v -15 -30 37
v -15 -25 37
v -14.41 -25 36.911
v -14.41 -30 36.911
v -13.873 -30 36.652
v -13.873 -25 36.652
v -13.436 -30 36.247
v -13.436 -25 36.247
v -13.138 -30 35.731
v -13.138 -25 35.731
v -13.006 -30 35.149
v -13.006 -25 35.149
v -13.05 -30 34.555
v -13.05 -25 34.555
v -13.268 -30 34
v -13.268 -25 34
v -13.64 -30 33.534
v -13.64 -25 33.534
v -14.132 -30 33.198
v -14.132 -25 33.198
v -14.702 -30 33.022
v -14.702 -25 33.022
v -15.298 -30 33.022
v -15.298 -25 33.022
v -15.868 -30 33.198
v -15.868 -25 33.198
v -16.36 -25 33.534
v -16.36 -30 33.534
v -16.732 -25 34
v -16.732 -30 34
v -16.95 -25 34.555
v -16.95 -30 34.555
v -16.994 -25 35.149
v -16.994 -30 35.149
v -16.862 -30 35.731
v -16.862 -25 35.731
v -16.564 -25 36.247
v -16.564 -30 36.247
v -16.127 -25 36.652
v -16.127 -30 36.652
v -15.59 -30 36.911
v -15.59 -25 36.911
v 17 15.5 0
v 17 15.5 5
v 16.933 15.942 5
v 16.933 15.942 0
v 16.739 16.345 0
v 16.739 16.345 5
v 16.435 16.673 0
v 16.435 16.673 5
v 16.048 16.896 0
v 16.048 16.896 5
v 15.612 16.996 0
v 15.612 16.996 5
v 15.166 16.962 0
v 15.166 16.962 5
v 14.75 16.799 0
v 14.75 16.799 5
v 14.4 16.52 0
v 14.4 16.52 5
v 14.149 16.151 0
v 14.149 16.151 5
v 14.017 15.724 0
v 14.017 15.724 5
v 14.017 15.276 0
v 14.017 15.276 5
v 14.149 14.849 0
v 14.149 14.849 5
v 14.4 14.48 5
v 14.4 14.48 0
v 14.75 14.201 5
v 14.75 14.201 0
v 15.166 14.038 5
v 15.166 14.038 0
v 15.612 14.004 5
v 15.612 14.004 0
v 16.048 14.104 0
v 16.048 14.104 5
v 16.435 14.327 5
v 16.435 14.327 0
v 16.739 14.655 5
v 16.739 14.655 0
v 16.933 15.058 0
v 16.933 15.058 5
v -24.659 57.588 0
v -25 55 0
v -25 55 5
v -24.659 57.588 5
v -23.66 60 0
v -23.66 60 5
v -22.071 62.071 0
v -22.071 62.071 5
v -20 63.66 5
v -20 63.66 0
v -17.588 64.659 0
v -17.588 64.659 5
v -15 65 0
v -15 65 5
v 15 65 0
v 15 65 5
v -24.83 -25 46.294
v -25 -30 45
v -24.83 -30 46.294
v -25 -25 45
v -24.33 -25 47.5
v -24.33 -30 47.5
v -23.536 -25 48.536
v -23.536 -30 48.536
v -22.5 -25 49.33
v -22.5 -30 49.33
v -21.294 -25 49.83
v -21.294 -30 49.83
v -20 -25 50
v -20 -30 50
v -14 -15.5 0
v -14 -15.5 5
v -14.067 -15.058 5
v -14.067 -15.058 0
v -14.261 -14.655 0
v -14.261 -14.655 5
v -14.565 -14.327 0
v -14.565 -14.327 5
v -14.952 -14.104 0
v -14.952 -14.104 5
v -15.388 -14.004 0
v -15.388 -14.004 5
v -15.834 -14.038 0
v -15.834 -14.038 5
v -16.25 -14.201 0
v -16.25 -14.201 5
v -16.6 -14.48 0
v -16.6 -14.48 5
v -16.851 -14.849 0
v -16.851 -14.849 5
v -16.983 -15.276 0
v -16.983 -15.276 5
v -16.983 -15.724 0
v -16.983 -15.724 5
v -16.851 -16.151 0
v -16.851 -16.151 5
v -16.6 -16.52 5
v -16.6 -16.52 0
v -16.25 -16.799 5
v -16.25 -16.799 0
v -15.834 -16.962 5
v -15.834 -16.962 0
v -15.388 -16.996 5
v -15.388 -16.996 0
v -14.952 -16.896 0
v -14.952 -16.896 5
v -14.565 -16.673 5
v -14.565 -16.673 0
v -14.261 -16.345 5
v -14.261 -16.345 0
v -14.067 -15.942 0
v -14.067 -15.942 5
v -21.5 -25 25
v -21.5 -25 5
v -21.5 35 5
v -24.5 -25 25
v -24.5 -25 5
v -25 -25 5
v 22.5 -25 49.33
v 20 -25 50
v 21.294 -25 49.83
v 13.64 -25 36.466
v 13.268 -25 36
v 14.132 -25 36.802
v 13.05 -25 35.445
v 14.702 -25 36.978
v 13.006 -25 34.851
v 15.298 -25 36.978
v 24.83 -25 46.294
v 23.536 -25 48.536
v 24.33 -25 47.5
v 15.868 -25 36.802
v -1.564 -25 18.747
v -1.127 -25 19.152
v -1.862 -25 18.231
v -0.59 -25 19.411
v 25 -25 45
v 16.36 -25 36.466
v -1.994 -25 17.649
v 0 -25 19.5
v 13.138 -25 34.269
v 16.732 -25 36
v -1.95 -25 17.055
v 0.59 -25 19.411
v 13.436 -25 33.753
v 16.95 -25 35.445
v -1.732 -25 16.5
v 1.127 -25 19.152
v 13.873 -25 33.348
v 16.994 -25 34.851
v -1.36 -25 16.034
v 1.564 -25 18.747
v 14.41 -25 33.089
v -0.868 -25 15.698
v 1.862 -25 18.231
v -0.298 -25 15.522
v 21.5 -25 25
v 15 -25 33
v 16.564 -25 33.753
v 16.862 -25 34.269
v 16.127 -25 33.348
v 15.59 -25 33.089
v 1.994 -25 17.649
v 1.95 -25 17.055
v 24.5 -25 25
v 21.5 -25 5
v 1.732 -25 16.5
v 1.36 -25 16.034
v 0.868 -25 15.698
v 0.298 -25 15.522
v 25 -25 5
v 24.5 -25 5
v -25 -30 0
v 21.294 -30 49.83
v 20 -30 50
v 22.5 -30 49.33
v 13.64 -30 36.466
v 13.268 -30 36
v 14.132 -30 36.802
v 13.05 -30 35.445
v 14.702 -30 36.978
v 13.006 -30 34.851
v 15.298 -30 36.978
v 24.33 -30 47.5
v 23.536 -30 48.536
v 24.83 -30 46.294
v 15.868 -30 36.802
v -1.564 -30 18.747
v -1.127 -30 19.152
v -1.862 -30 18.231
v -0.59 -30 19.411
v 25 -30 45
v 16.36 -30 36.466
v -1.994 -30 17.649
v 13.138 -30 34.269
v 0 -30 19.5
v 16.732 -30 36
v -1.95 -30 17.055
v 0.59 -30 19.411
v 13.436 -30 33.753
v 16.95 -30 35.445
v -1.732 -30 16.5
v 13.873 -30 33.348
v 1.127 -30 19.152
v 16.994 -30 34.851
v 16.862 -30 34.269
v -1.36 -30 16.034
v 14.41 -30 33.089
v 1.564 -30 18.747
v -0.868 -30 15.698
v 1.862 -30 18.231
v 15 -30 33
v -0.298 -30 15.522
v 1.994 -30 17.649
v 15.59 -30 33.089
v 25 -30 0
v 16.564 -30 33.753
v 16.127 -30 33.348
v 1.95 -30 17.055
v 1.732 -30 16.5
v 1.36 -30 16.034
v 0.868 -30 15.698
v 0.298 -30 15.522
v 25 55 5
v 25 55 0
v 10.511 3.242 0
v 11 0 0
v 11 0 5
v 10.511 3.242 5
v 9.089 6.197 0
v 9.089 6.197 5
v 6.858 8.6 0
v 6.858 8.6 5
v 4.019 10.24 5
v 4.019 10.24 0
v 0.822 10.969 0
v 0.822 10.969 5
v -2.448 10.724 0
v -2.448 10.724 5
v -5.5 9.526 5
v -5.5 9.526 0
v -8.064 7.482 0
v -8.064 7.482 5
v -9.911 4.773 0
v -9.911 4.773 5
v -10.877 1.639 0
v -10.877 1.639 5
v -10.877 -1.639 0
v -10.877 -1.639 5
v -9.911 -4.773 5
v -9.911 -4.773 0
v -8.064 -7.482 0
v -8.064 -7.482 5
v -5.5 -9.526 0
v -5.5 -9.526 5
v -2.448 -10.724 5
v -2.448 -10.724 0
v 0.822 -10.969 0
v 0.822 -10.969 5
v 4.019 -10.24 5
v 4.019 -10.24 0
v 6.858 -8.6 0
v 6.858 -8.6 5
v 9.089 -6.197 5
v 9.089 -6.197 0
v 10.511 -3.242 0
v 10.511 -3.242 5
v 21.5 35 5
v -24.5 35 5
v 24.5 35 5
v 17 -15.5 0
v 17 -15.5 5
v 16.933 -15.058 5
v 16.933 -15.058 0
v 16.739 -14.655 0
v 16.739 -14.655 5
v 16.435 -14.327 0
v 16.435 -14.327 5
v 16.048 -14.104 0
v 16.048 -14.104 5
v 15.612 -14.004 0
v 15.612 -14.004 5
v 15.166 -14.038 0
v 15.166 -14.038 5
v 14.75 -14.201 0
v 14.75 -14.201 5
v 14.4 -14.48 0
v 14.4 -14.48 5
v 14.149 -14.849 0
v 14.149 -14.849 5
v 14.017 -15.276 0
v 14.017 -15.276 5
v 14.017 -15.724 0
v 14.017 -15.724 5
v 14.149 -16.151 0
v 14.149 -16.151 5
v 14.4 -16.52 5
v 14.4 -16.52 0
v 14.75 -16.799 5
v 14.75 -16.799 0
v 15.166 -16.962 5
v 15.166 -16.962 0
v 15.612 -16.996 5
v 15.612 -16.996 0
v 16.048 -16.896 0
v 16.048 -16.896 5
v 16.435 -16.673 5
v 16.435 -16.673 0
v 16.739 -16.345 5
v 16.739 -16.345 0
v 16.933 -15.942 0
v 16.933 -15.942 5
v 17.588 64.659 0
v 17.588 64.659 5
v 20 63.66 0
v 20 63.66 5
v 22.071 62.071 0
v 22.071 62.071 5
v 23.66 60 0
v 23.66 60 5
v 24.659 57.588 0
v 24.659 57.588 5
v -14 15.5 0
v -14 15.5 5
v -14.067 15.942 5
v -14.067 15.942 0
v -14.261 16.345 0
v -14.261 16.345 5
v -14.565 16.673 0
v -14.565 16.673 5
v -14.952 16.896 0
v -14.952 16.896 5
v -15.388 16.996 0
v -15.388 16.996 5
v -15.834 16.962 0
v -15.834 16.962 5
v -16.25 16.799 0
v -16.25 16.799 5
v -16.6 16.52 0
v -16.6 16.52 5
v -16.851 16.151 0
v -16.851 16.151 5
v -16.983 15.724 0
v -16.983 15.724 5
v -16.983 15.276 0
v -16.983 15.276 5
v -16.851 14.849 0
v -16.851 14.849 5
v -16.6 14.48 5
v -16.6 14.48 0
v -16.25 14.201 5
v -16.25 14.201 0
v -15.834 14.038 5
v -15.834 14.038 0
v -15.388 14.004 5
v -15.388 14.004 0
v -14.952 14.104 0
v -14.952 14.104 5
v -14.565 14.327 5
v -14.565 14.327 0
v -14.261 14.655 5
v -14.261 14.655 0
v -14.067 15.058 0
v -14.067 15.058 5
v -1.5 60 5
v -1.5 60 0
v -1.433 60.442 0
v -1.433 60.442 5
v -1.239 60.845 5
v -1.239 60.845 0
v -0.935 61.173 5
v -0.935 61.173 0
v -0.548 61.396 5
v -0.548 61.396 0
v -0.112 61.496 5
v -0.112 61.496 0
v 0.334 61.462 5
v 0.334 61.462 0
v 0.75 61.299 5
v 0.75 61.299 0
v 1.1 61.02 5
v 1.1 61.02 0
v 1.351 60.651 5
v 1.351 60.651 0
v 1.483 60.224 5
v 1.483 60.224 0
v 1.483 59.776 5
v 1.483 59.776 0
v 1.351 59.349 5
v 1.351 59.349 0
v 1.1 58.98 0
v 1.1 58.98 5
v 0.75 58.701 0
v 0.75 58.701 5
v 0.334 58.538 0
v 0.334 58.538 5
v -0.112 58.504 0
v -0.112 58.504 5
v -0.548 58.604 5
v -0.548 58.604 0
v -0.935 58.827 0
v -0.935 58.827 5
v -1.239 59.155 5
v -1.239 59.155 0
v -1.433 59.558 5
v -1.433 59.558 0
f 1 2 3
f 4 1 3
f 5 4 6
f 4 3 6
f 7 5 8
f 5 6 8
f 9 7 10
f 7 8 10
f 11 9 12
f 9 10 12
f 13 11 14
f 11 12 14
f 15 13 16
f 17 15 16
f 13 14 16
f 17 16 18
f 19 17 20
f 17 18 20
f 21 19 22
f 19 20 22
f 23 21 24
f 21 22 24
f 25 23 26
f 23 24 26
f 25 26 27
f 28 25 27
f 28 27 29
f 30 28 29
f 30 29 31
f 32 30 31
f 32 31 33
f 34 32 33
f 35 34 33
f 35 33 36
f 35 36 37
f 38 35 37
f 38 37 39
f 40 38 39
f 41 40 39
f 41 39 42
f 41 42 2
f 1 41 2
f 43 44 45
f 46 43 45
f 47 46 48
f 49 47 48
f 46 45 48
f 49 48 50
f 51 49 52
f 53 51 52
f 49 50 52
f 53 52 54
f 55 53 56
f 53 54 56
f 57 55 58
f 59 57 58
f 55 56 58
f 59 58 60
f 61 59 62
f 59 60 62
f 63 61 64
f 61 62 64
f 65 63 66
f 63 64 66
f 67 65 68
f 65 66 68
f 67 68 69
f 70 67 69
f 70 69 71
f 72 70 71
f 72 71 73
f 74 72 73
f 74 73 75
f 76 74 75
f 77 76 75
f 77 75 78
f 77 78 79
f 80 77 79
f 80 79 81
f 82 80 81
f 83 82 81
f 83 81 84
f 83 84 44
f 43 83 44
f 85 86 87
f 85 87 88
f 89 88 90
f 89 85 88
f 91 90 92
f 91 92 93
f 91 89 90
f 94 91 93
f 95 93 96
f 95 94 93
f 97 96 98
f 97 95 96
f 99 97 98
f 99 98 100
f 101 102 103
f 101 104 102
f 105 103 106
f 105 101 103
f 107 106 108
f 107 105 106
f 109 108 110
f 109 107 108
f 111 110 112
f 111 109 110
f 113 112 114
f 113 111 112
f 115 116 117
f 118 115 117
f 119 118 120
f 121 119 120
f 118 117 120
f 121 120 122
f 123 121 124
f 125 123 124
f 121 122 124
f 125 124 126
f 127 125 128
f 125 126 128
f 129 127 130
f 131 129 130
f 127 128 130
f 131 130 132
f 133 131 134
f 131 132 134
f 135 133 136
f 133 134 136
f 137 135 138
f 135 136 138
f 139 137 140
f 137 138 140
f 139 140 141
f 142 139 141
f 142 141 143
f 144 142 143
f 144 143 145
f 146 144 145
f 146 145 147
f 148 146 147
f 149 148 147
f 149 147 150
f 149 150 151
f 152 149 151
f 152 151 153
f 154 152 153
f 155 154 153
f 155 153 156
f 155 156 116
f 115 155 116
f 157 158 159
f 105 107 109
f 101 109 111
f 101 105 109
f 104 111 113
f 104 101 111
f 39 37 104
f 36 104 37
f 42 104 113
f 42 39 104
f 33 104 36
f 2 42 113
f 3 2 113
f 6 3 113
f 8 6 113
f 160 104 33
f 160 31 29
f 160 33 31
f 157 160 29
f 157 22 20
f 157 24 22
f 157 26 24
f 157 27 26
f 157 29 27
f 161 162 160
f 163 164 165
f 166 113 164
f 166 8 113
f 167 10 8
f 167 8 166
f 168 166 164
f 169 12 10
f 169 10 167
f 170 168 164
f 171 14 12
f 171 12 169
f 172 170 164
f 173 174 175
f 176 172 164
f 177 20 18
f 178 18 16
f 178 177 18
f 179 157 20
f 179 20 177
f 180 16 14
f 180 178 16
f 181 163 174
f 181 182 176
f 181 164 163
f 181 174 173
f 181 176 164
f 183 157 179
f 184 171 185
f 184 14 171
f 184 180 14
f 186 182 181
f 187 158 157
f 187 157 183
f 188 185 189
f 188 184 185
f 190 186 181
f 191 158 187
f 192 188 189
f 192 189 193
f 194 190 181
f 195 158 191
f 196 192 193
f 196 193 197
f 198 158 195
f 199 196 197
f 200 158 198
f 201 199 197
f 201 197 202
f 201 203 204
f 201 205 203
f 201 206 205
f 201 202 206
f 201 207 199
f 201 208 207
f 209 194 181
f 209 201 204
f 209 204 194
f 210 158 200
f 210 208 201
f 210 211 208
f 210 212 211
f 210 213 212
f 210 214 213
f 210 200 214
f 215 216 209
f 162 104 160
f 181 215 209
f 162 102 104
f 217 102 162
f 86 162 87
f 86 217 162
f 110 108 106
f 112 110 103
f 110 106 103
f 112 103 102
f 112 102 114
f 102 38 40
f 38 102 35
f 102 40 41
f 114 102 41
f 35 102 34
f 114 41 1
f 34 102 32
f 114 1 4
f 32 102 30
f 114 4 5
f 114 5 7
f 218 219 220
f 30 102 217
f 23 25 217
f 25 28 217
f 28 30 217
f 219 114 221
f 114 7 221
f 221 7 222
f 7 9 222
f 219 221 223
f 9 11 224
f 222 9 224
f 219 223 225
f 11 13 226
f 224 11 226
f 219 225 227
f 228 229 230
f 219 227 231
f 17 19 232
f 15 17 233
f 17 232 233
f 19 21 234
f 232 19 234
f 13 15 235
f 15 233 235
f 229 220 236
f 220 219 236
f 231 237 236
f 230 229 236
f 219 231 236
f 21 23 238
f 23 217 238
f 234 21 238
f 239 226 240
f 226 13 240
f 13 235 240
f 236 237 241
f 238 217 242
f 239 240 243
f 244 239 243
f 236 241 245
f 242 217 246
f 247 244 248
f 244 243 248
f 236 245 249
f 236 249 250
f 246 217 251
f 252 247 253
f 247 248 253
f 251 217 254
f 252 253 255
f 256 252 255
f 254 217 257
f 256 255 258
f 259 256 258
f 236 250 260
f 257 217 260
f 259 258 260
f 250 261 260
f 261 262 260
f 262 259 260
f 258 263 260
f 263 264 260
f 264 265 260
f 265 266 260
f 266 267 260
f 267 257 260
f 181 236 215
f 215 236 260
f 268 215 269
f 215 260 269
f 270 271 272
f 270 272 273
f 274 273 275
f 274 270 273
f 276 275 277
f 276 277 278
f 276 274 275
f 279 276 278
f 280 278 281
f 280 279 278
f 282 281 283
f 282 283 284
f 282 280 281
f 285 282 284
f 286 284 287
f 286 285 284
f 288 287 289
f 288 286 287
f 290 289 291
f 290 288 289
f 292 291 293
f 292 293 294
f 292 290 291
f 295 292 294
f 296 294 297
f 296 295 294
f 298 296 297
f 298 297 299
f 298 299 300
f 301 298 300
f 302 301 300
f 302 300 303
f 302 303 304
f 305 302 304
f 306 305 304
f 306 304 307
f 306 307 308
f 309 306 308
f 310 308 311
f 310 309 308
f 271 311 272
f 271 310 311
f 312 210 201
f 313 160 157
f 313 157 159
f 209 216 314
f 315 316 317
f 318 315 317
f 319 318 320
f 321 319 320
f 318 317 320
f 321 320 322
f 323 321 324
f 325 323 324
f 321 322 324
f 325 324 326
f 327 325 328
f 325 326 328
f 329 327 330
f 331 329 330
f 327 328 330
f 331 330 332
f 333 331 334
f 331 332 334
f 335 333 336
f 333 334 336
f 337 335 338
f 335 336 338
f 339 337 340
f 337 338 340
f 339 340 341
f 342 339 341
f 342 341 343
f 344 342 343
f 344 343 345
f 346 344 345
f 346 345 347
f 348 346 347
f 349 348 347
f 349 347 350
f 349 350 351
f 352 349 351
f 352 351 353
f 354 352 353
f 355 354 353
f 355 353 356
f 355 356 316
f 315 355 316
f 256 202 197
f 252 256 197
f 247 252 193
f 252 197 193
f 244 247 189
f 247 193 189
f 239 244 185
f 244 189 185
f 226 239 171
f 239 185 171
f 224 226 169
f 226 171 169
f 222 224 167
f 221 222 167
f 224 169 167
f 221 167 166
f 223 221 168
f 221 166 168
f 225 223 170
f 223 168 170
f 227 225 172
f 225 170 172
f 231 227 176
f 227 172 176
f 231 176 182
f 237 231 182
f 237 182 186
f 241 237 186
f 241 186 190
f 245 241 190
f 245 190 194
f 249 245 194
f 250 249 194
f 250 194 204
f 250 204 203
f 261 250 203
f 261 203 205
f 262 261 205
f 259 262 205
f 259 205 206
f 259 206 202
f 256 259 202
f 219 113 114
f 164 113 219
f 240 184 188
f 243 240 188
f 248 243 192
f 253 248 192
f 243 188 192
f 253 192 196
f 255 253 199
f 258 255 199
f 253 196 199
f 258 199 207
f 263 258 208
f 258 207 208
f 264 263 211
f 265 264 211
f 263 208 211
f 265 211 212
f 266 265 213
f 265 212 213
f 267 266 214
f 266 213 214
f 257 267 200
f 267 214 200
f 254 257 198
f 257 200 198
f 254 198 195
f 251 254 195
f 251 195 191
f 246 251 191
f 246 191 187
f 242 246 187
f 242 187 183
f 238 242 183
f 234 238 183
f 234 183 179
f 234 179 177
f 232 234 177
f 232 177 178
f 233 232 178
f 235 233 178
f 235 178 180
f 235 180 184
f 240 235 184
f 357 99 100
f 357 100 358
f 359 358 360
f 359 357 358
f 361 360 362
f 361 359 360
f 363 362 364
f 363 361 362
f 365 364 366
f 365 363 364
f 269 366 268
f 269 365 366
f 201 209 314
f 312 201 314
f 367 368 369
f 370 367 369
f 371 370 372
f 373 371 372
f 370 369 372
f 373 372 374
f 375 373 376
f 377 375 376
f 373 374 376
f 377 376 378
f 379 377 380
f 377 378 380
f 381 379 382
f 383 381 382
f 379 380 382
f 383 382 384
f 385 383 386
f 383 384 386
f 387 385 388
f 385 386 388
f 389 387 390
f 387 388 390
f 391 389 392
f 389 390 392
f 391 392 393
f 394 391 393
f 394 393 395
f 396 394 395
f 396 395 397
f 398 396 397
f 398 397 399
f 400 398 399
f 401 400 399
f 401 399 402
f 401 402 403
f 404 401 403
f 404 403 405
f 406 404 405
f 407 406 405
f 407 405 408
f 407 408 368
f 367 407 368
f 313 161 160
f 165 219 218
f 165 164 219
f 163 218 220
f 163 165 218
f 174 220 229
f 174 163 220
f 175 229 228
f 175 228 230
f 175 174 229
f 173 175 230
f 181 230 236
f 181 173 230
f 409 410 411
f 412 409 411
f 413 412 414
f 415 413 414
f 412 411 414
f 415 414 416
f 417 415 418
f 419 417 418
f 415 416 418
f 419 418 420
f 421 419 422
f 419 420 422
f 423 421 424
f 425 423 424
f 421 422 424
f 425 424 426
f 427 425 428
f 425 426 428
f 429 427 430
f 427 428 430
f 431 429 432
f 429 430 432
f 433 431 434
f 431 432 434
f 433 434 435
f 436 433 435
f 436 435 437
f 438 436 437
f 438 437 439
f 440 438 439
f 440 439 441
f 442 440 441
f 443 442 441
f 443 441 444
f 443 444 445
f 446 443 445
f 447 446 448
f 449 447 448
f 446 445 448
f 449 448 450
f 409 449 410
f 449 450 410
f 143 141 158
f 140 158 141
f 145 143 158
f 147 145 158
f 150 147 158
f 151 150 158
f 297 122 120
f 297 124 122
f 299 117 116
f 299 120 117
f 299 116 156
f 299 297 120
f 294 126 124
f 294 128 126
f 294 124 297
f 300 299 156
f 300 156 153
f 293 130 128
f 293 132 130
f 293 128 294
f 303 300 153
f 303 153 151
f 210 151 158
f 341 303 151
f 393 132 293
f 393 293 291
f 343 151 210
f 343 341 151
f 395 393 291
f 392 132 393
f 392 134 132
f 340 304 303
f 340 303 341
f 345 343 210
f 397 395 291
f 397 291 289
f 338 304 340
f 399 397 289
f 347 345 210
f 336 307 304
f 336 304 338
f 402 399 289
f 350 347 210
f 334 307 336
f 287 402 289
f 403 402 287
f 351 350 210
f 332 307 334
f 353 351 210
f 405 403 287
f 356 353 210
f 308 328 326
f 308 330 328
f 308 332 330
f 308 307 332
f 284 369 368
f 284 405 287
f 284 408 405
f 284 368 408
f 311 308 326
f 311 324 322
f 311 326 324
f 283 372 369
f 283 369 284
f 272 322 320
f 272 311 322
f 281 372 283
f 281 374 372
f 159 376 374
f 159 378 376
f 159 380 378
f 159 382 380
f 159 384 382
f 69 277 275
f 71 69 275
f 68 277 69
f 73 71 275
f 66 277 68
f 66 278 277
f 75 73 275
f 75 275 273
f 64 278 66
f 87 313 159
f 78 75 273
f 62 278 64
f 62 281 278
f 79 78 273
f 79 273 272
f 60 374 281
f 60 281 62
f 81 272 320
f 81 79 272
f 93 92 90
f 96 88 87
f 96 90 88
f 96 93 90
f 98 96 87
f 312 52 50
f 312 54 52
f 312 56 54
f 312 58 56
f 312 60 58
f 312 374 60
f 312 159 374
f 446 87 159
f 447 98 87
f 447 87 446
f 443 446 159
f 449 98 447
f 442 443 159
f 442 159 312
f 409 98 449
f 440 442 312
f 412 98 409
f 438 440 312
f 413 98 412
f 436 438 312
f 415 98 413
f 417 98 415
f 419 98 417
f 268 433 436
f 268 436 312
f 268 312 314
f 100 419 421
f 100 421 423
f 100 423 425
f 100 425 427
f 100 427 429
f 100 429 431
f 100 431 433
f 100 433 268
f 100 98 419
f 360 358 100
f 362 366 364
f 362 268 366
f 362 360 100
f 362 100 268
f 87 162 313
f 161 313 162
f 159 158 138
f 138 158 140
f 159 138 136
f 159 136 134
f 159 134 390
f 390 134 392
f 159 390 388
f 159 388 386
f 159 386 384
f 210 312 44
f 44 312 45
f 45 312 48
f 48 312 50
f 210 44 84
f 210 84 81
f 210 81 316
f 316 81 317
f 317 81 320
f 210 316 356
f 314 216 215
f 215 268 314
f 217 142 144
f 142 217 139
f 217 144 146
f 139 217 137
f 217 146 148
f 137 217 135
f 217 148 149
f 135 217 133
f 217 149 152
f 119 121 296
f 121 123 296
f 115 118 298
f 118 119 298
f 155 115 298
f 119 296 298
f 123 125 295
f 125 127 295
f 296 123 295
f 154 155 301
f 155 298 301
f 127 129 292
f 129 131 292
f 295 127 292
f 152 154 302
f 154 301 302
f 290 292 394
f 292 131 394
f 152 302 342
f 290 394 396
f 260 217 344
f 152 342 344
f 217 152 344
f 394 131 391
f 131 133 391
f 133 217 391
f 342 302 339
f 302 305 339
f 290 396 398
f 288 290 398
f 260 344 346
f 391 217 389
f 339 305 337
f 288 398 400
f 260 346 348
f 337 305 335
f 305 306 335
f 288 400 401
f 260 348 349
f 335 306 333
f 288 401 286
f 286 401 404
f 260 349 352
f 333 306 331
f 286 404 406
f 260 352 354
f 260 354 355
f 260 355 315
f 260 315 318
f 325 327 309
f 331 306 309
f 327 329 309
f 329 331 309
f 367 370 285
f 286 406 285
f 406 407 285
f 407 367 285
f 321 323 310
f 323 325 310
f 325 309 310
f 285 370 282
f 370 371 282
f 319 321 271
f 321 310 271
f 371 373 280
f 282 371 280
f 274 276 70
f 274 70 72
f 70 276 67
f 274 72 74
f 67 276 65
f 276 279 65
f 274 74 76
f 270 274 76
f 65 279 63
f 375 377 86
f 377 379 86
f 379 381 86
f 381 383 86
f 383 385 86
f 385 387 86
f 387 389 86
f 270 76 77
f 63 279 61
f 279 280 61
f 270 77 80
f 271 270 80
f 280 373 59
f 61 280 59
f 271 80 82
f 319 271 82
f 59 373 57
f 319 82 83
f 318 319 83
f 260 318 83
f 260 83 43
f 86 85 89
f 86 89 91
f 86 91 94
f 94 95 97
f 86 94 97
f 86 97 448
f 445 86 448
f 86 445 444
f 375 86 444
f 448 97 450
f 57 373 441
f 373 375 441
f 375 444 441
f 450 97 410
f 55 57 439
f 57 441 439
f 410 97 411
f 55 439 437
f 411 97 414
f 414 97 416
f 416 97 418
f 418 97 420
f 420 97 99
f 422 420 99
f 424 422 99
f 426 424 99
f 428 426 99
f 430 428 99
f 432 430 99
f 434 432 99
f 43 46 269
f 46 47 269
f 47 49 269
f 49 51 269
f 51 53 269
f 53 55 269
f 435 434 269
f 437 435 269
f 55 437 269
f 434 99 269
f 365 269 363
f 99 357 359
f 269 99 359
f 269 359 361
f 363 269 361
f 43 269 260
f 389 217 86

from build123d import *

# Parameters (mm, degrees)
ESQUISSE1_R             = 11
BOSS_EXTRU_2_DEPTH      = 5
ESQUISSE3_W             = 50
ESQUISSE3_H             = 5
BOSS_EXTRU_4_DEPTH      = 5
ESQUISSE2_W             = 50
ESQUISSE2_H             = 5
BOSS_EXTRU_3_DEPTH      = 45
ESQUISSE4_R             = 1.5
ENL_V_MAT_EXTRU_1_DEPTH = 60.581876439
CONG_1_R                = 5
ESQUISSE5_R             = 1.5
ESQUISSE5_R_2           = 11
BOSS_EXTRU_5_DEPTH      = 5
BOSS_EXTRU_6_START      = -0.5
BOSS_EXTRU_6_DEPTH      = 3
ESQUISSE9_R             = 2
ENL_V_MAT_EXTRU_3_DEPTH = 106.948100502


with BuildPart() as part:
    # Esquisse1 → Boss.-Extru.2 (new body)
    with BuildSketch(Plane.XY):
        with BuildLine():
            Line((-20, 25), (20, 25))
            ThreePointArc((20, 25), (23.535533906, 23.535533906), (25, 20))
            Line((25, 20), (25, -25))
            Line((25, -25), (-25, -25))
            Line((-25, -25), (-25, 20))
            ThreePointArc((-25, 20), (-23.535533906, 23.535533906), (-20, 25))
        make_face()
        Circle(ESQUISSE1_R, mode=Mode.SUBTRACT)
    extrude(amount=BOSS_EXTRU_2_DEPTH)

    # Esquisse3 → Boss.-Extru.4 (add)
    with BuildSketch(Plane.XZ.offset(25)):
        with Locations((0, 2.5)):
            Rectangle(ESQUISSE3_W, ESQUISSE3_H)
    extrude(amount=BOSS_EXTRU_4_DEPTH)

    # Esquisse2 → Boss.-Extru.3 (add)
    with BuildSketch(Plane.XY.offset(5)):
        with Locations((0, -27.5)):
            Rectangle(ESQUISSE2_W, ESQUISSE2_H)
    extrude(amount=BOSS_EXTRU_3_DEPTH)

    # Esquisse4 → Enlèv. mat.-Extru.1 (cut, through all)
    with BuildSketch(Plane.XY.offset(5)):
        with Locations((-15.5, 15.5)):
            Circle(ESQUISSE4_R)
        with Locations((15.5, 15.5)):
            Circle(ESQUISSE4_R)
        with Locations((15.5, -15.5)):
            Circle(ESQUISSE4_R)
        with Locations((-15.5, -15.5)):
            Circle(ESQUISSE4_R)
    extrude(amount=-ENL_V_MAT_EXTRU_1_DEPTH, mode=Mode.SUBTRACT)

    # Congé1
    cong_1_edges = [part.edges().sort_by_distance(p)[0] for p in [
        (25, -27.5, 50),
        (-25, -27.5, 50),
    ]]
    fillet(cong_1_edges, radius=CONG_1_R)

    # Esquisse5 → Boss.-Extru.5 (add)
    # profile 1 of 3: a face of its own
    with BuildSketch(Plane(origin=(0, 0, 0), x_dir=(-1, 0, 0), z_dir=(0, 0, -1))):
        with BuildLine():
            ThreePointArc((-20, 25), (-23.535533906, 23.535533906), (-25, 20))
            Line((-25, 20), (-25, -30))
            Line((-25, -30), (25, -30))
            Line((25, -30), (25, 20))
            ThreePointArc((25, 20), (23.535533906, 23.535533906), (20, 25))
            Line((20, 25), (-20, 25))
        make_face()
        with Locations(Location((-15.5, -15.5, 0), (0, 0, 180))):
            Circle(ESQUISSE5_R, mode=Mode.SUBTRACT)
        with Locations(Location((-15.5, 15.5, 0), (0, 0, 180))):
            Circle(ESQUISSE5_R, mode=Mode.SUBTRACT)
        with Locations(Location((0, 0, 0), (0, 0, 180))):
            Circle(ESQUISSE5_R_2, mode=Mode.SUBTRACT)
        with Locations(Location((15.5, -15.5, 0), (0, 0, 180))):
            Circle(ESQUISSE5_R, mode=Mode.SUBTRACT)
        with Locations(Location((15.5, 15.5, 0), (0, 0, 180))):
            Circle(ESQUISSE5_R, mode=Mode.SUBTRACT)
    # profile 2 of 3: a face of its own
    with BuildSketch(Plane(origin=(0, 0, 0), x_dir=(-1, 0, 0), z_dir=(0, 0, -1))):
        with BuildLine():
            Line((-25, 55), (-25, 20))
            ThreePointArc((-25, 20), (-23.535533906, 23.535533906), (-20, 25))
            Line((-20, 25), (20, 25))
            ThreePointArc((20, 25), (23.535533906, 23.535533906), (25, 20))
            Line((25, 20), (25, 55))
            ThreePointArc((25, 55), (22.071067812, 62.071067812), (15, 65))
            Line((15, 65), (-15, 65))
            ThreePointArc((-15, 65), (-22.071067812, 62.071067812), (-25, 55))
        make_face()
        with Locations((0, 60)):
            Circle(ESQUISSE5_R, mode=Mode.SUBTRACT)
    # profile 3 of 3: a face of its own
    with BuildSketch(Plane(origin=(0, 0, 0), x_dir=(-1, 0, 0), z_dir=(0, 0, -1))):
        with BuildLine():
            ThreePointArc((-20, 25), (-23.535533906, 23.535533906), (-25, 20))
            Line((-25, 20), (-25, -30))
            Line((-25, -30), (25, -30))
            Line((25, -30), (25, 20))
            ThreePointArc((25, 20), (23.535533906, 23.535533906), (20, 25))
            Line((20, 25), (-20, 25))
        make_face()
        with Locations(Location((-15.5, -15.5, 0), (0, 0, 180))):
            Circle(ESQUISSE5_R, mode=Mode.SUBTRACT)
        with Locations(Location((-15.5, 15.5, 0), (0, 0, 180))):
            Circle(ESQUISSE5_R, mode=Mode.SUBTRACT)
        with Locations(Location((0, 0, 0), (0, 0, 180))):
            Circle(ESQUISSE5_R_2, mode=Mode.SUBTRACT)
        with Locations(Location((15.5, -15.5, 0), (0, 0, 180))):
            Circle(ESQUISSE5_R, mode=Mode.SUBTRACT)
        with Locations(Location((15.5, 15.5, 0), (0, 0, 180))):
            Circle(ESQUISSE5_R, mode=Mode.SUBTRACT)
    extrude(amount=-BOSS_EXTRU_5_DEPTH)

    # Esquisse7 → Boss.-Extru.6 (add)
    with BuildSketch(Plane.ZY.offset(25).offset(BOSS_EXTRU_6_START)):
        Polygon((25, -25), (5, 35), (5, -25), align=None)
    boss_extru_6 = extrude(amount=-BOSS_EXTRU_6_DEPTH)

    # Symétrie1: Boss.-Extru.6 across plane
    add(boss_extru_6.mirror(Plane(origin=(0, 0, 0), x_dir=(0, 0, 1), z_dir=(1, 0, 0))))

    # Esquisse9 → Enlèv. mat.-Extru.3 (cut, through all)
    with BuildSketch(Plane(origin=(0, -25, 0), x_dir=(1, 0, 0), z_dir=(0, 1, 0))):
        with Locations(Location((-15, -35, 0), (0, 0, 270))):
            Circle(ESQUISSE9_R)
        with Locations(Location((15, -35, 0), (0, 0, 90))):
            Circle(ESQUISSE9_R)
        with Locations(Location((0, -17.5, 0), (0, 0, 270))):
            Circle(ESQUISSE9_R)
    extrude(amount=-ENL_V_MAT_EXTRU_3_DEPTH, mode=Mode.SUBTRACT)


solid = part.part
